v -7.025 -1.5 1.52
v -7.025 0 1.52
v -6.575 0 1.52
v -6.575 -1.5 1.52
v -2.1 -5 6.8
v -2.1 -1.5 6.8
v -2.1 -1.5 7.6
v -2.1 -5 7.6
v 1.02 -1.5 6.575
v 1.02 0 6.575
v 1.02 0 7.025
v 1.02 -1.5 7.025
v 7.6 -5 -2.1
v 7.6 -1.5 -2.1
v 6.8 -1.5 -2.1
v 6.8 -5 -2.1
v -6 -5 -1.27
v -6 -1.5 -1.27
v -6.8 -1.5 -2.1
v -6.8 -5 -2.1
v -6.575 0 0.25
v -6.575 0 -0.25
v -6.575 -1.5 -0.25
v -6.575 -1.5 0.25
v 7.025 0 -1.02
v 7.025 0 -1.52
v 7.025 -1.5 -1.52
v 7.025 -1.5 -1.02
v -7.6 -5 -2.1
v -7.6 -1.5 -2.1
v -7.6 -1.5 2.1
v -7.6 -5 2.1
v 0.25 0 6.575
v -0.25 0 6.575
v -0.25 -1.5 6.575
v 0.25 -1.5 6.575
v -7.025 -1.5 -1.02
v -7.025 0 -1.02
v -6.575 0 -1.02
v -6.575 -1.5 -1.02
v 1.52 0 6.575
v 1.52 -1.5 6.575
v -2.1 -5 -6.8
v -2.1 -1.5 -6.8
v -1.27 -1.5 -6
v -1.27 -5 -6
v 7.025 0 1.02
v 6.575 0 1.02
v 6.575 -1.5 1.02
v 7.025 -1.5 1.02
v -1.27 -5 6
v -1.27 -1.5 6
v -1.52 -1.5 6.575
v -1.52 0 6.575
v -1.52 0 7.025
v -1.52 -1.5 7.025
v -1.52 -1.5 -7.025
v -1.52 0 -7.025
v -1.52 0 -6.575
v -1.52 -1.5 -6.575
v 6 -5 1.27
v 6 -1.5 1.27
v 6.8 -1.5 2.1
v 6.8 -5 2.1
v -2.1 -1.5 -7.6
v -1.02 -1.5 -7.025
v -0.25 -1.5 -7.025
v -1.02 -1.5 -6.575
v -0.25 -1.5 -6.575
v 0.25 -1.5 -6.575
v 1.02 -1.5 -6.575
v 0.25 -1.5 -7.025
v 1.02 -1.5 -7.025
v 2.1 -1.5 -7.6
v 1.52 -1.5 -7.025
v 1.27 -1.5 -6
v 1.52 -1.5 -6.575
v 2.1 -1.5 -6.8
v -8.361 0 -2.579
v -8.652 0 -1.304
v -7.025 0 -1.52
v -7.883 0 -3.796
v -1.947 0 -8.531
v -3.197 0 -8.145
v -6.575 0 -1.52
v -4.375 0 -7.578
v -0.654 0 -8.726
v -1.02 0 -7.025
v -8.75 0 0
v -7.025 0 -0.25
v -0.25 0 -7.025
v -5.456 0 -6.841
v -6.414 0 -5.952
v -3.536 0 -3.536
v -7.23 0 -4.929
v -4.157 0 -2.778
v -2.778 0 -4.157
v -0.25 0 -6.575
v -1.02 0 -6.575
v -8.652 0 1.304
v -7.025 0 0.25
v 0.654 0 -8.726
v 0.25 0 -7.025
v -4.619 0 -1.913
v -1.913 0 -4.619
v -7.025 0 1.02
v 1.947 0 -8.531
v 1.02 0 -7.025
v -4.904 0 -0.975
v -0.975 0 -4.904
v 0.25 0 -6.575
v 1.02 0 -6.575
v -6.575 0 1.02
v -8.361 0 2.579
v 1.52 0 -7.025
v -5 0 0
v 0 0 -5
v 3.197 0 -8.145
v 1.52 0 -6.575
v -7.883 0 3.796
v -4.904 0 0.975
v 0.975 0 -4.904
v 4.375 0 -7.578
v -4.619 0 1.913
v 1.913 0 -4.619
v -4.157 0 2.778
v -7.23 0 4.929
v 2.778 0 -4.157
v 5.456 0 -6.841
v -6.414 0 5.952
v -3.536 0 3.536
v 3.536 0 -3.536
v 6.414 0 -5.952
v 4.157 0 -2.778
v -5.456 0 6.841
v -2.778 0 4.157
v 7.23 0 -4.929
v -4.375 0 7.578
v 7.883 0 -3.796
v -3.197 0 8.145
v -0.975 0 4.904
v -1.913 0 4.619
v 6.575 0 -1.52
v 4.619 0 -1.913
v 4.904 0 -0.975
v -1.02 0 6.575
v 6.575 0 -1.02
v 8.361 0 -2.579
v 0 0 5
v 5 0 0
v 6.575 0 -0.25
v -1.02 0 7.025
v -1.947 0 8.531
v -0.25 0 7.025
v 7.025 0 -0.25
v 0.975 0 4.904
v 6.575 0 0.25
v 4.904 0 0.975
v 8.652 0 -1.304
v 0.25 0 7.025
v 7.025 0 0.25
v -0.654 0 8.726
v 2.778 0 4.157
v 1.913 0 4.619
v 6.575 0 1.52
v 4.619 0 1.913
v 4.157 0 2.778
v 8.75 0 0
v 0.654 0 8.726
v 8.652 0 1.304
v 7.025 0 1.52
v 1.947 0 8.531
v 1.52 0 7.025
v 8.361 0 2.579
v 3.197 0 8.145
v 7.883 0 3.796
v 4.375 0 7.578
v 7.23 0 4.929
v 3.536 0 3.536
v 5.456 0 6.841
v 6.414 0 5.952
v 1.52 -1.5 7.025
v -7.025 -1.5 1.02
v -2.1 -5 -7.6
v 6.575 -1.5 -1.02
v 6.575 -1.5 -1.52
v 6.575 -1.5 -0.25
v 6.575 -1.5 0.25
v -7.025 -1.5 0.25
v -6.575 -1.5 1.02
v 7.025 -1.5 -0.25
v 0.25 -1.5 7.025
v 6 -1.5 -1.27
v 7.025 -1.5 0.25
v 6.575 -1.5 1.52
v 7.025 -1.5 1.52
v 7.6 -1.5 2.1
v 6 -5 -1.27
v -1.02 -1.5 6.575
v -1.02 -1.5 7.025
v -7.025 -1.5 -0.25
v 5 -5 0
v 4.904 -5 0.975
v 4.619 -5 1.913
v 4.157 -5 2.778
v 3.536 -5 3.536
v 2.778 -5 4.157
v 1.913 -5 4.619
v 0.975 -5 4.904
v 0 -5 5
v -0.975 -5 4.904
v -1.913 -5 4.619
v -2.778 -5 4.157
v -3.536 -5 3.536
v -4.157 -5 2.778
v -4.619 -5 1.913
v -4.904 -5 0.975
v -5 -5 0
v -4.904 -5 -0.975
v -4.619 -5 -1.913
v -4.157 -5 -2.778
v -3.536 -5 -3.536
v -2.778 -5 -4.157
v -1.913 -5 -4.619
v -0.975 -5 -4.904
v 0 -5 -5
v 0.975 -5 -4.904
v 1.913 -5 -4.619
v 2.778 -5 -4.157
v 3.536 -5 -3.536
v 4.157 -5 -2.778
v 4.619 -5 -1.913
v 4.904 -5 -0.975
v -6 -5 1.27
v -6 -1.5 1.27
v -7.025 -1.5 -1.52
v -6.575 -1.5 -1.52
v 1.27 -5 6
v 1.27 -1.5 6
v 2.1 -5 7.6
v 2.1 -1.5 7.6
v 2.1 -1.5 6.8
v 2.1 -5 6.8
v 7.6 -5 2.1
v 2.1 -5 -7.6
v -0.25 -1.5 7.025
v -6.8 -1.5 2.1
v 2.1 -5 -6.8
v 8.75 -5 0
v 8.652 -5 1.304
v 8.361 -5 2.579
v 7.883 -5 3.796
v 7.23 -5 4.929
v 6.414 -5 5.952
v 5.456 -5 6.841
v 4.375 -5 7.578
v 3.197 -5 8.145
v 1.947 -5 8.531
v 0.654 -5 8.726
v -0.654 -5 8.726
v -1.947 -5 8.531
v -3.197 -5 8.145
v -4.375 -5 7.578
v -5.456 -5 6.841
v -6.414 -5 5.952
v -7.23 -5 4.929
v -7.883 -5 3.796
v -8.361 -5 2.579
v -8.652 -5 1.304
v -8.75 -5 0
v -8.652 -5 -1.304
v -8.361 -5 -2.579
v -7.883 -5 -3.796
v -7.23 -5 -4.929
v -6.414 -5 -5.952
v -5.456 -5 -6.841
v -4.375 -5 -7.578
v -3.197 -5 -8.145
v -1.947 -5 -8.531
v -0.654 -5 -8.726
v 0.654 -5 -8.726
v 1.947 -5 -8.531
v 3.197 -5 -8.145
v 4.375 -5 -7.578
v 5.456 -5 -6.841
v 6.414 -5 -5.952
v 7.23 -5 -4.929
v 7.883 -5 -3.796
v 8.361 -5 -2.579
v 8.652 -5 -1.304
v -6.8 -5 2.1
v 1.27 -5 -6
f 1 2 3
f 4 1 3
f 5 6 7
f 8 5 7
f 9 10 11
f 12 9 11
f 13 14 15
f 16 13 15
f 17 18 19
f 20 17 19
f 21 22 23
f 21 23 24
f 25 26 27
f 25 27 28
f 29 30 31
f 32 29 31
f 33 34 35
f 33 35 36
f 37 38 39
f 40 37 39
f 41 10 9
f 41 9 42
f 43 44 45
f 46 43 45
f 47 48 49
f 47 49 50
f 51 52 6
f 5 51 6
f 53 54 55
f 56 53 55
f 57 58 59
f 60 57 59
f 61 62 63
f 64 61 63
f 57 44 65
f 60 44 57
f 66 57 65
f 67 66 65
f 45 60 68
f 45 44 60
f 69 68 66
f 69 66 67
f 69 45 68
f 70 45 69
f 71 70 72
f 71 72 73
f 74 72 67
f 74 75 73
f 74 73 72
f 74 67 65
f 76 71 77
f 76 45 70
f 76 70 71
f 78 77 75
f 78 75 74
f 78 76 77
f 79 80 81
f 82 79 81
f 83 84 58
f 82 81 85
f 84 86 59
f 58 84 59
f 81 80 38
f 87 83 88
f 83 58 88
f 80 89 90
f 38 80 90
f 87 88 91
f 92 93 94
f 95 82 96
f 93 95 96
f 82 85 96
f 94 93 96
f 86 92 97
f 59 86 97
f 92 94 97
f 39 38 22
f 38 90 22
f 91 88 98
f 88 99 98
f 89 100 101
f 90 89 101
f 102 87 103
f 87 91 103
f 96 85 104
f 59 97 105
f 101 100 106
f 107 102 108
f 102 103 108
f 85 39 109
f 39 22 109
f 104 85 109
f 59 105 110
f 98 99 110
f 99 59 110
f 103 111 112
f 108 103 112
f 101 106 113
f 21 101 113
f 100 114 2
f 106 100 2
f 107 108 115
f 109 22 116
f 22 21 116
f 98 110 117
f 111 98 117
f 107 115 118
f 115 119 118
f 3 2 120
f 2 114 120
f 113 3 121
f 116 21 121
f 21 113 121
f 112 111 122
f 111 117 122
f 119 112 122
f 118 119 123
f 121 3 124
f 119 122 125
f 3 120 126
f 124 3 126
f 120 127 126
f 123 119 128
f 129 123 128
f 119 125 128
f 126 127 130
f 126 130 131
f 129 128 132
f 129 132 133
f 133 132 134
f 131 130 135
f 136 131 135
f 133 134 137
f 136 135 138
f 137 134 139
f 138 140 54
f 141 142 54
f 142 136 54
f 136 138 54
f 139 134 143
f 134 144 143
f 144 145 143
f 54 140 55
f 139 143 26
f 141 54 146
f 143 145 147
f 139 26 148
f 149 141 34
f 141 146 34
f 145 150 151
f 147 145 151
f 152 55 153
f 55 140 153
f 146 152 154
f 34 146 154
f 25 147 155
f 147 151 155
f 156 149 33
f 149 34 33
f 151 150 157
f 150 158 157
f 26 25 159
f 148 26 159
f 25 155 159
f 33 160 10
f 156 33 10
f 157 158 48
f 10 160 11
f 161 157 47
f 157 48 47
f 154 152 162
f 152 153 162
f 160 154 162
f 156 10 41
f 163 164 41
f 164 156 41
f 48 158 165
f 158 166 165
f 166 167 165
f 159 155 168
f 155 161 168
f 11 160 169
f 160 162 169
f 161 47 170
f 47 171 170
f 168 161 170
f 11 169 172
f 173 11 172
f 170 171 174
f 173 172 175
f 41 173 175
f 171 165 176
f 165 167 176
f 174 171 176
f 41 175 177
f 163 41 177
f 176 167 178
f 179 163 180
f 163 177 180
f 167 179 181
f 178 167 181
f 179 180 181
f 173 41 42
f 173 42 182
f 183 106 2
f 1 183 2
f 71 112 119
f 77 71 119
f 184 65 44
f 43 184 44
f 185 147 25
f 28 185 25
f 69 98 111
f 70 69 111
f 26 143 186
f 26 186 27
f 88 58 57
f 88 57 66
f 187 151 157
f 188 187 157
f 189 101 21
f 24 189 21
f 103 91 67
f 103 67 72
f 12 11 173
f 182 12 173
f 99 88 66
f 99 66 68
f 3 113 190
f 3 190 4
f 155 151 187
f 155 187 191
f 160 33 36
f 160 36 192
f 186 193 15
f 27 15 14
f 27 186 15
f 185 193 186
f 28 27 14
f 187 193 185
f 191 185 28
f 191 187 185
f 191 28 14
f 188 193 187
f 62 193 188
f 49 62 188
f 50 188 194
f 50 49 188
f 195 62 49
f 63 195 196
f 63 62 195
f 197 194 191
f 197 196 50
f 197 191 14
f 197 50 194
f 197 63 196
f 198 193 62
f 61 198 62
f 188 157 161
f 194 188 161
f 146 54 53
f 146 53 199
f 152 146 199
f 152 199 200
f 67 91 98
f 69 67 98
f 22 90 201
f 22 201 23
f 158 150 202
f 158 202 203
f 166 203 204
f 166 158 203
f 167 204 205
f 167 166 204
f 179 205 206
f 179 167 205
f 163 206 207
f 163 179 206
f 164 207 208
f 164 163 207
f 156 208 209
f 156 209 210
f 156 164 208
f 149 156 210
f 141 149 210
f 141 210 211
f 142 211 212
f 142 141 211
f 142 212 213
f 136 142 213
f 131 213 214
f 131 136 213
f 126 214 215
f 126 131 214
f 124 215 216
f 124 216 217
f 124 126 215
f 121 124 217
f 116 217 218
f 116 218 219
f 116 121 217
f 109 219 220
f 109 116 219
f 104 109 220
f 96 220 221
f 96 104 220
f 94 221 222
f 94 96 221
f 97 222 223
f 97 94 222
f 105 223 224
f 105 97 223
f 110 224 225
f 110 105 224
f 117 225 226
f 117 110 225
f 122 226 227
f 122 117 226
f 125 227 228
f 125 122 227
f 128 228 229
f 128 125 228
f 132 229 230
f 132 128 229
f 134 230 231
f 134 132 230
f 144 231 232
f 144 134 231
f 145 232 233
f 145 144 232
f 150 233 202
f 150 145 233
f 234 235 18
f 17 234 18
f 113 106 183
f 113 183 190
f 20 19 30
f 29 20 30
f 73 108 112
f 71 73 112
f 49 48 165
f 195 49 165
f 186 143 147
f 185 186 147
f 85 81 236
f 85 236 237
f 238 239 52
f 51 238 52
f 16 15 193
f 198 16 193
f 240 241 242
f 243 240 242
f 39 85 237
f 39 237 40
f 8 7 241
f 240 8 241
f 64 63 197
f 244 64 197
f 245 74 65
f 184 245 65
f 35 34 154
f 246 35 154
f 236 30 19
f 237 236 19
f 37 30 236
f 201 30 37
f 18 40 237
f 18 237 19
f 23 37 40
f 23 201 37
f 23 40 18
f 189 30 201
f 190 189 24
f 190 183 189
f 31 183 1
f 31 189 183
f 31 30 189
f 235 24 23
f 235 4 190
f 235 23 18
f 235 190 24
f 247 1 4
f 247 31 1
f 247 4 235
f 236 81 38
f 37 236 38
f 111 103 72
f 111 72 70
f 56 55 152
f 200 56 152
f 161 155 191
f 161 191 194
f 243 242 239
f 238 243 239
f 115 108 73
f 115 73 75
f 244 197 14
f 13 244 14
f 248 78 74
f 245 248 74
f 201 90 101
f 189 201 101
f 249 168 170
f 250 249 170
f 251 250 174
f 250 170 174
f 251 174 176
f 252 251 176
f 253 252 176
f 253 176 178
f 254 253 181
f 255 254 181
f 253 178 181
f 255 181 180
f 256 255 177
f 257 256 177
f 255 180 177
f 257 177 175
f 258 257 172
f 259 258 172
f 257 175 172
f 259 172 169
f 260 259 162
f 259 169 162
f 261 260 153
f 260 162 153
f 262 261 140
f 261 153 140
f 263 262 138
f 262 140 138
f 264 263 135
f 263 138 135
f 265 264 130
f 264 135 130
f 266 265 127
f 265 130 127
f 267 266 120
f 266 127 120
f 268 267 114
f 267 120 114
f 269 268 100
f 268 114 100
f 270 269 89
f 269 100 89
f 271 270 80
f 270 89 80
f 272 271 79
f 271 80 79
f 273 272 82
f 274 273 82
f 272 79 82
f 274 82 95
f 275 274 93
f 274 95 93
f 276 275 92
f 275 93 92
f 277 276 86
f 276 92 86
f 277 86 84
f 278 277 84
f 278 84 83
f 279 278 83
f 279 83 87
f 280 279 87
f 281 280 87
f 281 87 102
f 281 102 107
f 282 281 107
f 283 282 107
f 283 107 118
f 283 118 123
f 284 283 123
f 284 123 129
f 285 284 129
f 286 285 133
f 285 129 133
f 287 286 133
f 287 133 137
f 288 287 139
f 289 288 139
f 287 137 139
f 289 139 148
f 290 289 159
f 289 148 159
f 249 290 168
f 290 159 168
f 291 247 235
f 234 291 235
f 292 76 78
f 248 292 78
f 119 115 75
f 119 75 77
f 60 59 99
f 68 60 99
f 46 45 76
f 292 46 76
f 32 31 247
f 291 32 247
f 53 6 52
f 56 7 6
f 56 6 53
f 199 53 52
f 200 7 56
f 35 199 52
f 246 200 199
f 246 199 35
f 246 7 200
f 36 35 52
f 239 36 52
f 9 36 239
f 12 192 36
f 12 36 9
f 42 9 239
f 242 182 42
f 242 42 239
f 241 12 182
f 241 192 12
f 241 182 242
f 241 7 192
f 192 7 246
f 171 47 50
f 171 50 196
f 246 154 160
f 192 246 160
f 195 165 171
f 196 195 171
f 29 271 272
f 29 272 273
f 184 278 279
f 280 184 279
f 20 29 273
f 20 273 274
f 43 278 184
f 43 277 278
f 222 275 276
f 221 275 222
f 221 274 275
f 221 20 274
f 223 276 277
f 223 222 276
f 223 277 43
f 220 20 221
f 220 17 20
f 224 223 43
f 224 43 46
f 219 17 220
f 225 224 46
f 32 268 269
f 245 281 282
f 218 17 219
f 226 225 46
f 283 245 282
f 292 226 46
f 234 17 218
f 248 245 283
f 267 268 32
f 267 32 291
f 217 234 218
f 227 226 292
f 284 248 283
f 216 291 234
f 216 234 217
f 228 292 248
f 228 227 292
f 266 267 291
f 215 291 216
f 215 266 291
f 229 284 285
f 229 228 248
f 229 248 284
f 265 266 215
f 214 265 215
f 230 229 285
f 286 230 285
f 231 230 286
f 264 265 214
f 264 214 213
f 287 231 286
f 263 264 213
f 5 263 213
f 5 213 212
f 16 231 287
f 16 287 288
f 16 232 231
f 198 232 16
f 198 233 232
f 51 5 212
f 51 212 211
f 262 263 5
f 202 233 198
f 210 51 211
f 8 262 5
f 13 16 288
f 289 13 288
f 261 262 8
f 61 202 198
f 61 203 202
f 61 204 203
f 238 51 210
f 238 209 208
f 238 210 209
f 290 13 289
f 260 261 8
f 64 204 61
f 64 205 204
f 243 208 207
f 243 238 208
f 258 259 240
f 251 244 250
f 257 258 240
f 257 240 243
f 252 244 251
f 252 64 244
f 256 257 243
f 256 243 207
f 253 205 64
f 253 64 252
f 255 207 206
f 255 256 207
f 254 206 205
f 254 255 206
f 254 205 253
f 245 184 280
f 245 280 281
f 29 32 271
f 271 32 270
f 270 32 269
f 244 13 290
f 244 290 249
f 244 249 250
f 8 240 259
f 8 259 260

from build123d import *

# Parameters (mm, degrees)
F0_R     = 8.75
F0_R_2   = 5
F1_DEPTH = 5
F0_W     = 0.5
F0_H     = 0.45
F0_W_2   = 0.45
F0_H_2   = 0.5
F2_DEPTH = 1.5


with BuildPart() as f1:
    # F0 (on Front) → F1 (new body)
    with BuildSketch(Plane.XZ):
        Circle(F0_R)
        Polygon((-2.1, -6.8), (-1.27, -6), (1.27, -6), (2.1, -6.8), (2.1, -7.6), (-2.1, -7.6), align=None, mode=Mode.SUBTRACT)
        Polygon((-6.8, 2.1), (-6, 1.27), (-6, -1.27), (-6.8, -2.1), (-7.6, -2.1), (-7.6, 2.1), align=None, mode=Mode.SUBTRACT)
        Circle(F0_R_2, mode=Mode.SUBTRACT)
        Polygon((6.8, -2.1), (6, -1.27), (6, 1.27), (6.8, 2.1), (7.6, 2.1), (7.6, -2.1), align=None, mode=Mode.SUBTRACT)
        Polygon((-2.1, 6.8), (-2.1, 7.6), (2.1, 7.6), (2.1, 6.8), (1.27, 6), (-1.27, 6), align=None, mode=Mode.SUBTRACT)
    extrude(amount=F1_DEPTH)

    # F0 (on Front) → F2 (join)
    with BuildSketch(Plane.XZ):
        Polygon((2.1, 7.6), (-2.1, 7.6), (-2.1, 6.8), (-1.27, 6), (1.27, 6), (2.1, 6.8), align=None)
        with Locations((-1.27, 6.8)):
            Rectangle(F0_W, F0_H, mode=Mode.SUBTRACT)
        with Locations((0, 6.8)):
            Rectangle(F0_W, F0_H, mode=Mode.SUBTRACT)
        with Locations((1.27, 6.8)):
            Rectangle(F0_W, F0_H, mode=Mode.SUBTRACT)
        Polygon((-6, -1.27), (-6, 1.27), (-6.8, 2.1), (-7.6, 2.1), (-7.6, -2.1), (-6.8, -2.1), align=None)
        with Locations((-6.8, -1.27)):
            Rectangle(F0_W_2, F0_H_2, mode=Mode.SUBTRACT)
        with Locations((-6.8, 0)):
            Rectangle(F0_W_2, F0_H_2, mode=Mode.SUBTRACT)
        with Locations((-6.8, 1.27)):
            Rectangle(F0_W_2, F0_H_2, mode=Mode.SUBTRACT)
        Polygon((1.27, -6), (-1.27, -6), (-2.1, -6.8), (-2.1, -7.6), (2.1, -7.6), (2.1, -6.8), align=None)
        with Locations((-1.27, -6.8)):
            Rectangle(F0_W, F0_H, mode=Mode.SUBTRACT)
        with Locations((0, -6.8)):
            Rectangle(F0_W, F0_H, mode=Mode.SUBTRACT)
        with Locations((1.27, -6.8)):
            Rectangle(F0_W, F0_H, mode=Mode.SUBTRACT)
        Polygon((6, 1.27), (6, -1.27), (6.8, -2.1), (7.6, -2.1), (7.6, 2.1), (6.8, 2.1), align=None)
        with Locations((6.8, -1.27)):
            Rectangle(F0_W_2, F0_H_2, mode=Mode.SUBTRACT)
        with Locations((6.8, 0)):
            Rectangle(F0_W_2, F0_H_2, mode=Mode.SUBTRACT)
        with Locations((6.8, 1.27)):
            Rectangle(F0_W_2, F0_H_2, mode=Mode.SUBTRACT)
    extrude(amount=F2_DEPTH)


solid = f1.part
